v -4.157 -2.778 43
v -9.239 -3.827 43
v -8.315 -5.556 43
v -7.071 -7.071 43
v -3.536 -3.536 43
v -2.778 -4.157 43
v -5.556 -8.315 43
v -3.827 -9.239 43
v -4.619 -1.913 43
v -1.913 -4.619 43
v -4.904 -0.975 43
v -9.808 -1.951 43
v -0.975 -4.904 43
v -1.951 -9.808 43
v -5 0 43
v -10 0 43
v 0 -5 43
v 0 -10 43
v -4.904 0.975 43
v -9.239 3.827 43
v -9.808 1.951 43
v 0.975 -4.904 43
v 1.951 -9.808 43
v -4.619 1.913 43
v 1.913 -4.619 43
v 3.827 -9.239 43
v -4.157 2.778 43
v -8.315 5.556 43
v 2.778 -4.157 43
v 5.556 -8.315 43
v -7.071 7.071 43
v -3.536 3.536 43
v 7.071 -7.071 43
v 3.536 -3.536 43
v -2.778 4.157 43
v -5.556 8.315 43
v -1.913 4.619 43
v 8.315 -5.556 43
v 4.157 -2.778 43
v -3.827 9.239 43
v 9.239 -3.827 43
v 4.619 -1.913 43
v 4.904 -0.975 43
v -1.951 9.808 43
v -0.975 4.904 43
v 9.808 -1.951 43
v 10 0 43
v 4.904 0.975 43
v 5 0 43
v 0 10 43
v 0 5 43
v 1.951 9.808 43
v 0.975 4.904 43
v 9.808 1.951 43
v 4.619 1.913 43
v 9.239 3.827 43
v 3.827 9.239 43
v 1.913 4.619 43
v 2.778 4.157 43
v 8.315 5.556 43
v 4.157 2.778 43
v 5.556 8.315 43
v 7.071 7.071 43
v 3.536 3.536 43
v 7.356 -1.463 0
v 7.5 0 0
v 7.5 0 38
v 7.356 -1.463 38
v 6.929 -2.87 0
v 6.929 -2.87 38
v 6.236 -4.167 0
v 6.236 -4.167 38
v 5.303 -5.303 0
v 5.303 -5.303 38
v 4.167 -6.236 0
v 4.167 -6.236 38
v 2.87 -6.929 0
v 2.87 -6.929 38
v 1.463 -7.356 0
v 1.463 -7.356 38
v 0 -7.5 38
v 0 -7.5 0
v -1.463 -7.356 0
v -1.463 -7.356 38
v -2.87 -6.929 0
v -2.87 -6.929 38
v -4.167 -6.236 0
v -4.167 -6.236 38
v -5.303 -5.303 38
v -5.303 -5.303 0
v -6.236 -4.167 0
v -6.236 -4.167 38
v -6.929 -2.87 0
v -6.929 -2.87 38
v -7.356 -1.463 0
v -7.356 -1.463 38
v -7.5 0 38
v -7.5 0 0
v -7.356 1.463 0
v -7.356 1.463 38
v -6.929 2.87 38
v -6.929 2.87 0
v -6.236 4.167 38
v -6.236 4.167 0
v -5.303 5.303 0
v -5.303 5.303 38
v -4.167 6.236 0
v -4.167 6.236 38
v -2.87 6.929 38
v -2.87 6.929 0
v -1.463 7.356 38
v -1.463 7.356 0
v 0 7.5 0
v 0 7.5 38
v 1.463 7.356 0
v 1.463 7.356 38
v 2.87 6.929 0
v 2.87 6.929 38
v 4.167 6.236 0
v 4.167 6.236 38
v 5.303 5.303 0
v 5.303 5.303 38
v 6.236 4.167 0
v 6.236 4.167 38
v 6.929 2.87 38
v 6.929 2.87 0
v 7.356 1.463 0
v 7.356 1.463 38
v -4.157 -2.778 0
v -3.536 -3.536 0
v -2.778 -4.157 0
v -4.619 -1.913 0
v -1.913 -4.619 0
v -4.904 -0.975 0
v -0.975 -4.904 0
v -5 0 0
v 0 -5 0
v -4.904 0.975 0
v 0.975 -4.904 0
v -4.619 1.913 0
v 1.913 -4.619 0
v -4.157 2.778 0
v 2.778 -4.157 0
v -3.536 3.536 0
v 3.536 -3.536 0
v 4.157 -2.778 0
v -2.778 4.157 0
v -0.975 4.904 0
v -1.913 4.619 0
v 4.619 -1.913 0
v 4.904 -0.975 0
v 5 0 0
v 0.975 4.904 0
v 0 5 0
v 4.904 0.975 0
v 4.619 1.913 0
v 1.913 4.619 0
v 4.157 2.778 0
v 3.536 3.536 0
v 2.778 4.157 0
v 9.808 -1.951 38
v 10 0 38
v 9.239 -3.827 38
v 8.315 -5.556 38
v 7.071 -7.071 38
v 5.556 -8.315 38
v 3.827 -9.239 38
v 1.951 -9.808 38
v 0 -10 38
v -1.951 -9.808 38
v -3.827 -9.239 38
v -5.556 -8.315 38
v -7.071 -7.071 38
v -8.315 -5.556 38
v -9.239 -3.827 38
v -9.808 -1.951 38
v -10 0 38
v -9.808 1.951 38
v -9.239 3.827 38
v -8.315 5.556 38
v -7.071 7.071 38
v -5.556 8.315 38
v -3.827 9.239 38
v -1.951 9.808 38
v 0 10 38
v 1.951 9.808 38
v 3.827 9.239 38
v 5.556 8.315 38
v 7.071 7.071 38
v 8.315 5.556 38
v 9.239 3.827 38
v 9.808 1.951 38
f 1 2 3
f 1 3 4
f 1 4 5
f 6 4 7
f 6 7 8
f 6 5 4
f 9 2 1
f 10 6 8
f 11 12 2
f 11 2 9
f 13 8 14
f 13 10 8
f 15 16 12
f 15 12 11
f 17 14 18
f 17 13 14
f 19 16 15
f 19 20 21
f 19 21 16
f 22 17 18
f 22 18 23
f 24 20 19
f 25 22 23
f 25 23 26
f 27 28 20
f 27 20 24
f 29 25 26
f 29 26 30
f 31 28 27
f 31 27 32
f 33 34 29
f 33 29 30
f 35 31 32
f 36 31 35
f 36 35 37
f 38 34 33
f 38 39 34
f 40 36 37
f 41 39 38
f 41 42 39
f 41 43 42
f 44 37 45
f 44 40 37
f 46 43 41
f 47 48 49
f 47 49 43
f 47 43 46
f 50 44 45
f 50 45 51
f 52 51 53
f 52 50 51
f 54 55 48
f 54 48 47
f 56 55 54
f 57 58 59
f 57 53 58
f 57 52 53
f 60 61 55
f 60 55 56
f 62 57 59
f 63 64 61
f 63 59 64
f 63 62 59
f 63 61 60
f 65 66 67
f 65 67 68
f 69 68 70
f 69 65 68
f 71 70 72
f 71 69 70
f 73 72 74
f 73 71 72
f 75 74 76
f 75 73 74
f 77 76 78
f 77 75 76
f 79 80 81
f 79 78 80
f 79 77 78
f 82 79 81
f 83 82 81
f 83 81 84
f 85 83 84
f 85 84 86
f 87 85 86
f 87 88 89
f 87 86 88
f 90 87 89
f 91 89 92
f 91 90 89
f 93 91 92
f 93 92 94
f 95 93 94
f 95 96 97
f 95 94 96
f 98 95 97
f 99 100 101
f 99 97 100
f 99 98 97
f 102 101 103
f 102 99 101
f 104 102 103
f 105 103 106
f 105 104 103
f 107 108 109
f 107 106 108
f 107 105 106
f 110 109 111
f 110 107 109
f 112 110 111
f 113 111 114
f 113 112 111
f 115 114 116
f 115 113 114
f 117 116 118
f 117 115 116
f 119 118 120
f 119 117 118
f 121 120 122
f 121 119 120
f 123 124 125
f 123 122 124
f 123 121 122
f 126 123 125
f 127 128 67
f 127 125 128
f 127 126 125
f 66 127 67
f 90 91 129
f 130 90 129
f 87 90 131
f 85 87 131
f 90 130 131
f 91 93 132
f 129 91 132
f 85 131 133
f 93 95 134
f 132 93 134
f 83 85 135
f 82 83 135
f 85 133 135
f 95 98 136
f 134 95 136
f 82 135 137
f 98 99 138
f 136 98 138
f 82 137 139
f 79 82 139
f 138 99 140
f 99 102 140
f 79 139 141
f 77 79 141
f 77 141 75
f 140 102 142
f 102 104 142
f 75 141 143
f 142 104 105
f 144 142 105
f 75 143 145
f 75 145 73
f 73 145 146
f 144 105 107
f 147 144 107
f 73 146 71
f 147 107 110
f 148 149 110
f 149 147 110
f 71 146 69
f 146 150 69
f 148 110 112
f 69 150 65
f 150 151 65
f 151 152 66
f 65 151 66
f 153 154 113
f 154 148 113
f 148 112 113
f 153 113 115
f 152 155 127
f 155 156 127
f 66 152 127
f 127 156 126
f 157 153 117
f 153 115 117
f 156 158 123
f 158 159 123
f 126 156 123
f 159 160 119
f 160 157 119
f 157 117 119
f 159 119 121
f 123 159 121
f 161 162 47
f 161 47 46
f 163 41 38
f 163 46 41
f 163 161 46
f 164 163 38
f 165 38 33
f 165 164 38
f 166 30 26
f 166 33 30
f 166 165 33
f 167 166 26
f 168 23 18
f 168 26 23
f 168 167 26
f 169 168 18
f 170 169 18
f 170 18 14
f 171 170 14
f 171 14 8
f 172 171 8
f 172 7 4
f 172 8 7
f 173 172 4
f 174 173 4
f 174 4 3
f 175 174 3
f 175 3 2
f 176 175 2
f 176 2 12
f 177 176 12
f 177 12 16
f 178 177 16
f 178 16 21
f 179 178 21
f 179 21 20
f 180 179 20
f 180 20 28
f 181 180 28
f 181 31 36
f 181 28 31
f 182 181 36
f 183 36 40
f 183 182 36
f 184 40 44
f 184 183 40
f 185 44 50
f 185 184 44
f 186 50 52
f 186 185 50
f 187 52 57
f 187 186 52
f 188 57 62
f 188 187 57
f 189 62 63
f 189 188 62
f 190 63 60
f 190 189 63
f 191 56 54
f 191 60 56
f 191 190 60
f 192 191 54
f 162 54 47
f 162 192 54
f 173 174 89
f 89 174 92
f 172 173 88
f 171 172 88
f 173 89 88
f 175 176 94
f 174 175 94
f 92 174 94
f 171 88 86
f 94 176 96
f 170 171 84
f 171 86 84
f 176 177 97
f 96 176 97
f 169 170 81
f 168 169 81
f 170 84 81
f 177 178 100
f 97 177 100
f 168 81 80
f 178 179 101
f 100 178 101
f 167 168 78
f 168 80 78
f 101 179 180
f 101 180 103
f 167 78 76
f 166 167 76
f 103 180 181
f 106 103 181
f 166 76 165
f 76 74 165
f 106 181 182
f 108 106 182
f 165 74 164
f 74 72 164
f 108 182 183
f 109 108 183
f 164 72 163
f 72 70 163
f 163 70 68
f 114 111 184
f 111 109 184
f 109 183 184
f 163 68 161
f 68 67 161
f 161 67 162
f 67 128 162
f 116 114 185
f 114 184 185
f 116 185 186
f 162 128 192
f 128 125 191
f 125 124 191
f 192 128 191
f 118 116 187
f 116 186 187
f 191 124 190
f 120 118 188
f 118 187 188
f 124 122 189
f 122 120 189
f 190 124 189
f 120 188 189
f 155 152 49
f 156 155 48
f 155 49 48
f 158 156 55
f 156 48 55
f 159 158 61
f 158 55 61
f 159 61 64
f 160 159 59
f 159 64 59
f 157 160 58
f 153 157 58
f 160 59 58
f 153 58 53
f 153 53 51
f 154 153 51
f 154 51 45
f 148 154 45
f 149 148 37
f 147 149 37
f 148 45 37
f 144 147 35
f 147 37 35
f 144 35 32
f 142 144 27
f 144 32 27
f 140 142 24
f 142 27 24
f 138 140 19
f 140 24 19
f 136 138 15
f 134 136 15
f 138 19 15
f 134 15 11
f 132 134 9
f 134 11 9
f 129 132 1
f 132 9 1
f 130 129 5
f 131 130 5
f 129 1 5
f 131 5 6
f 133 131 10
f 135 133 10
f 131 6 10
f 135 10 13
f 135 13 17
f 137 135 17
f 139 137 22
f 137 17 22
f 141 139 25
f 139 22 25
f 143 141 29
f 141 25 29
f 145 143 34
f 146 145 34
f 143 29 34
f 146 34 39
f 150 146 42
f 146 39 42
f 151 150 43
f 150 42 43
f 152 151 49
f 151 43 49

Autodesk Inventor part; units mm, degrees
ref_plane "YZ Plane" through (0, 0, 0) normal (1, 0, 0) x (0, 1, 0)
ref_plane "XZ Plane" through (0, 0, 0) normal (0, 1, 0) x (-1, 0, 0)
ref_plane "XY Plane" through (0, 0, 0) normal (0, 0, 1) x (1, 0, 0)
sketch "Sketch1" plane through (0, 0, 0) normal (0, 0, 1) x (1, 0, 0)
  circle A0 centre (0, 0) radius 7.5
  dimension "d0" = 15
extrude "Extrusion1" add sketch "Sketch1" along normal blind 38
sketch "Sketch2" plane through (0, 0, 38) normal (0, 0, 1) x (1, 0, 0)
  circle A0 centre (0, 0) radius 10
  dimension "d3" = 20
extrude "Extrusion2" add sketch "Sketch2" along normal blind 5
sketch "Sketch5" plane through (0, 0, 43) normal (0, 0, 1) x (1, 0, 0)
  circle A0 centre (0, 0) radius 10 projected
  circle A1 centre (0, 0) radius 5
  dimension "d12" = 10
extrude "Extrusion5" cut sketch "Sketch5" against normal through all contours A1
properties part number "Top"
